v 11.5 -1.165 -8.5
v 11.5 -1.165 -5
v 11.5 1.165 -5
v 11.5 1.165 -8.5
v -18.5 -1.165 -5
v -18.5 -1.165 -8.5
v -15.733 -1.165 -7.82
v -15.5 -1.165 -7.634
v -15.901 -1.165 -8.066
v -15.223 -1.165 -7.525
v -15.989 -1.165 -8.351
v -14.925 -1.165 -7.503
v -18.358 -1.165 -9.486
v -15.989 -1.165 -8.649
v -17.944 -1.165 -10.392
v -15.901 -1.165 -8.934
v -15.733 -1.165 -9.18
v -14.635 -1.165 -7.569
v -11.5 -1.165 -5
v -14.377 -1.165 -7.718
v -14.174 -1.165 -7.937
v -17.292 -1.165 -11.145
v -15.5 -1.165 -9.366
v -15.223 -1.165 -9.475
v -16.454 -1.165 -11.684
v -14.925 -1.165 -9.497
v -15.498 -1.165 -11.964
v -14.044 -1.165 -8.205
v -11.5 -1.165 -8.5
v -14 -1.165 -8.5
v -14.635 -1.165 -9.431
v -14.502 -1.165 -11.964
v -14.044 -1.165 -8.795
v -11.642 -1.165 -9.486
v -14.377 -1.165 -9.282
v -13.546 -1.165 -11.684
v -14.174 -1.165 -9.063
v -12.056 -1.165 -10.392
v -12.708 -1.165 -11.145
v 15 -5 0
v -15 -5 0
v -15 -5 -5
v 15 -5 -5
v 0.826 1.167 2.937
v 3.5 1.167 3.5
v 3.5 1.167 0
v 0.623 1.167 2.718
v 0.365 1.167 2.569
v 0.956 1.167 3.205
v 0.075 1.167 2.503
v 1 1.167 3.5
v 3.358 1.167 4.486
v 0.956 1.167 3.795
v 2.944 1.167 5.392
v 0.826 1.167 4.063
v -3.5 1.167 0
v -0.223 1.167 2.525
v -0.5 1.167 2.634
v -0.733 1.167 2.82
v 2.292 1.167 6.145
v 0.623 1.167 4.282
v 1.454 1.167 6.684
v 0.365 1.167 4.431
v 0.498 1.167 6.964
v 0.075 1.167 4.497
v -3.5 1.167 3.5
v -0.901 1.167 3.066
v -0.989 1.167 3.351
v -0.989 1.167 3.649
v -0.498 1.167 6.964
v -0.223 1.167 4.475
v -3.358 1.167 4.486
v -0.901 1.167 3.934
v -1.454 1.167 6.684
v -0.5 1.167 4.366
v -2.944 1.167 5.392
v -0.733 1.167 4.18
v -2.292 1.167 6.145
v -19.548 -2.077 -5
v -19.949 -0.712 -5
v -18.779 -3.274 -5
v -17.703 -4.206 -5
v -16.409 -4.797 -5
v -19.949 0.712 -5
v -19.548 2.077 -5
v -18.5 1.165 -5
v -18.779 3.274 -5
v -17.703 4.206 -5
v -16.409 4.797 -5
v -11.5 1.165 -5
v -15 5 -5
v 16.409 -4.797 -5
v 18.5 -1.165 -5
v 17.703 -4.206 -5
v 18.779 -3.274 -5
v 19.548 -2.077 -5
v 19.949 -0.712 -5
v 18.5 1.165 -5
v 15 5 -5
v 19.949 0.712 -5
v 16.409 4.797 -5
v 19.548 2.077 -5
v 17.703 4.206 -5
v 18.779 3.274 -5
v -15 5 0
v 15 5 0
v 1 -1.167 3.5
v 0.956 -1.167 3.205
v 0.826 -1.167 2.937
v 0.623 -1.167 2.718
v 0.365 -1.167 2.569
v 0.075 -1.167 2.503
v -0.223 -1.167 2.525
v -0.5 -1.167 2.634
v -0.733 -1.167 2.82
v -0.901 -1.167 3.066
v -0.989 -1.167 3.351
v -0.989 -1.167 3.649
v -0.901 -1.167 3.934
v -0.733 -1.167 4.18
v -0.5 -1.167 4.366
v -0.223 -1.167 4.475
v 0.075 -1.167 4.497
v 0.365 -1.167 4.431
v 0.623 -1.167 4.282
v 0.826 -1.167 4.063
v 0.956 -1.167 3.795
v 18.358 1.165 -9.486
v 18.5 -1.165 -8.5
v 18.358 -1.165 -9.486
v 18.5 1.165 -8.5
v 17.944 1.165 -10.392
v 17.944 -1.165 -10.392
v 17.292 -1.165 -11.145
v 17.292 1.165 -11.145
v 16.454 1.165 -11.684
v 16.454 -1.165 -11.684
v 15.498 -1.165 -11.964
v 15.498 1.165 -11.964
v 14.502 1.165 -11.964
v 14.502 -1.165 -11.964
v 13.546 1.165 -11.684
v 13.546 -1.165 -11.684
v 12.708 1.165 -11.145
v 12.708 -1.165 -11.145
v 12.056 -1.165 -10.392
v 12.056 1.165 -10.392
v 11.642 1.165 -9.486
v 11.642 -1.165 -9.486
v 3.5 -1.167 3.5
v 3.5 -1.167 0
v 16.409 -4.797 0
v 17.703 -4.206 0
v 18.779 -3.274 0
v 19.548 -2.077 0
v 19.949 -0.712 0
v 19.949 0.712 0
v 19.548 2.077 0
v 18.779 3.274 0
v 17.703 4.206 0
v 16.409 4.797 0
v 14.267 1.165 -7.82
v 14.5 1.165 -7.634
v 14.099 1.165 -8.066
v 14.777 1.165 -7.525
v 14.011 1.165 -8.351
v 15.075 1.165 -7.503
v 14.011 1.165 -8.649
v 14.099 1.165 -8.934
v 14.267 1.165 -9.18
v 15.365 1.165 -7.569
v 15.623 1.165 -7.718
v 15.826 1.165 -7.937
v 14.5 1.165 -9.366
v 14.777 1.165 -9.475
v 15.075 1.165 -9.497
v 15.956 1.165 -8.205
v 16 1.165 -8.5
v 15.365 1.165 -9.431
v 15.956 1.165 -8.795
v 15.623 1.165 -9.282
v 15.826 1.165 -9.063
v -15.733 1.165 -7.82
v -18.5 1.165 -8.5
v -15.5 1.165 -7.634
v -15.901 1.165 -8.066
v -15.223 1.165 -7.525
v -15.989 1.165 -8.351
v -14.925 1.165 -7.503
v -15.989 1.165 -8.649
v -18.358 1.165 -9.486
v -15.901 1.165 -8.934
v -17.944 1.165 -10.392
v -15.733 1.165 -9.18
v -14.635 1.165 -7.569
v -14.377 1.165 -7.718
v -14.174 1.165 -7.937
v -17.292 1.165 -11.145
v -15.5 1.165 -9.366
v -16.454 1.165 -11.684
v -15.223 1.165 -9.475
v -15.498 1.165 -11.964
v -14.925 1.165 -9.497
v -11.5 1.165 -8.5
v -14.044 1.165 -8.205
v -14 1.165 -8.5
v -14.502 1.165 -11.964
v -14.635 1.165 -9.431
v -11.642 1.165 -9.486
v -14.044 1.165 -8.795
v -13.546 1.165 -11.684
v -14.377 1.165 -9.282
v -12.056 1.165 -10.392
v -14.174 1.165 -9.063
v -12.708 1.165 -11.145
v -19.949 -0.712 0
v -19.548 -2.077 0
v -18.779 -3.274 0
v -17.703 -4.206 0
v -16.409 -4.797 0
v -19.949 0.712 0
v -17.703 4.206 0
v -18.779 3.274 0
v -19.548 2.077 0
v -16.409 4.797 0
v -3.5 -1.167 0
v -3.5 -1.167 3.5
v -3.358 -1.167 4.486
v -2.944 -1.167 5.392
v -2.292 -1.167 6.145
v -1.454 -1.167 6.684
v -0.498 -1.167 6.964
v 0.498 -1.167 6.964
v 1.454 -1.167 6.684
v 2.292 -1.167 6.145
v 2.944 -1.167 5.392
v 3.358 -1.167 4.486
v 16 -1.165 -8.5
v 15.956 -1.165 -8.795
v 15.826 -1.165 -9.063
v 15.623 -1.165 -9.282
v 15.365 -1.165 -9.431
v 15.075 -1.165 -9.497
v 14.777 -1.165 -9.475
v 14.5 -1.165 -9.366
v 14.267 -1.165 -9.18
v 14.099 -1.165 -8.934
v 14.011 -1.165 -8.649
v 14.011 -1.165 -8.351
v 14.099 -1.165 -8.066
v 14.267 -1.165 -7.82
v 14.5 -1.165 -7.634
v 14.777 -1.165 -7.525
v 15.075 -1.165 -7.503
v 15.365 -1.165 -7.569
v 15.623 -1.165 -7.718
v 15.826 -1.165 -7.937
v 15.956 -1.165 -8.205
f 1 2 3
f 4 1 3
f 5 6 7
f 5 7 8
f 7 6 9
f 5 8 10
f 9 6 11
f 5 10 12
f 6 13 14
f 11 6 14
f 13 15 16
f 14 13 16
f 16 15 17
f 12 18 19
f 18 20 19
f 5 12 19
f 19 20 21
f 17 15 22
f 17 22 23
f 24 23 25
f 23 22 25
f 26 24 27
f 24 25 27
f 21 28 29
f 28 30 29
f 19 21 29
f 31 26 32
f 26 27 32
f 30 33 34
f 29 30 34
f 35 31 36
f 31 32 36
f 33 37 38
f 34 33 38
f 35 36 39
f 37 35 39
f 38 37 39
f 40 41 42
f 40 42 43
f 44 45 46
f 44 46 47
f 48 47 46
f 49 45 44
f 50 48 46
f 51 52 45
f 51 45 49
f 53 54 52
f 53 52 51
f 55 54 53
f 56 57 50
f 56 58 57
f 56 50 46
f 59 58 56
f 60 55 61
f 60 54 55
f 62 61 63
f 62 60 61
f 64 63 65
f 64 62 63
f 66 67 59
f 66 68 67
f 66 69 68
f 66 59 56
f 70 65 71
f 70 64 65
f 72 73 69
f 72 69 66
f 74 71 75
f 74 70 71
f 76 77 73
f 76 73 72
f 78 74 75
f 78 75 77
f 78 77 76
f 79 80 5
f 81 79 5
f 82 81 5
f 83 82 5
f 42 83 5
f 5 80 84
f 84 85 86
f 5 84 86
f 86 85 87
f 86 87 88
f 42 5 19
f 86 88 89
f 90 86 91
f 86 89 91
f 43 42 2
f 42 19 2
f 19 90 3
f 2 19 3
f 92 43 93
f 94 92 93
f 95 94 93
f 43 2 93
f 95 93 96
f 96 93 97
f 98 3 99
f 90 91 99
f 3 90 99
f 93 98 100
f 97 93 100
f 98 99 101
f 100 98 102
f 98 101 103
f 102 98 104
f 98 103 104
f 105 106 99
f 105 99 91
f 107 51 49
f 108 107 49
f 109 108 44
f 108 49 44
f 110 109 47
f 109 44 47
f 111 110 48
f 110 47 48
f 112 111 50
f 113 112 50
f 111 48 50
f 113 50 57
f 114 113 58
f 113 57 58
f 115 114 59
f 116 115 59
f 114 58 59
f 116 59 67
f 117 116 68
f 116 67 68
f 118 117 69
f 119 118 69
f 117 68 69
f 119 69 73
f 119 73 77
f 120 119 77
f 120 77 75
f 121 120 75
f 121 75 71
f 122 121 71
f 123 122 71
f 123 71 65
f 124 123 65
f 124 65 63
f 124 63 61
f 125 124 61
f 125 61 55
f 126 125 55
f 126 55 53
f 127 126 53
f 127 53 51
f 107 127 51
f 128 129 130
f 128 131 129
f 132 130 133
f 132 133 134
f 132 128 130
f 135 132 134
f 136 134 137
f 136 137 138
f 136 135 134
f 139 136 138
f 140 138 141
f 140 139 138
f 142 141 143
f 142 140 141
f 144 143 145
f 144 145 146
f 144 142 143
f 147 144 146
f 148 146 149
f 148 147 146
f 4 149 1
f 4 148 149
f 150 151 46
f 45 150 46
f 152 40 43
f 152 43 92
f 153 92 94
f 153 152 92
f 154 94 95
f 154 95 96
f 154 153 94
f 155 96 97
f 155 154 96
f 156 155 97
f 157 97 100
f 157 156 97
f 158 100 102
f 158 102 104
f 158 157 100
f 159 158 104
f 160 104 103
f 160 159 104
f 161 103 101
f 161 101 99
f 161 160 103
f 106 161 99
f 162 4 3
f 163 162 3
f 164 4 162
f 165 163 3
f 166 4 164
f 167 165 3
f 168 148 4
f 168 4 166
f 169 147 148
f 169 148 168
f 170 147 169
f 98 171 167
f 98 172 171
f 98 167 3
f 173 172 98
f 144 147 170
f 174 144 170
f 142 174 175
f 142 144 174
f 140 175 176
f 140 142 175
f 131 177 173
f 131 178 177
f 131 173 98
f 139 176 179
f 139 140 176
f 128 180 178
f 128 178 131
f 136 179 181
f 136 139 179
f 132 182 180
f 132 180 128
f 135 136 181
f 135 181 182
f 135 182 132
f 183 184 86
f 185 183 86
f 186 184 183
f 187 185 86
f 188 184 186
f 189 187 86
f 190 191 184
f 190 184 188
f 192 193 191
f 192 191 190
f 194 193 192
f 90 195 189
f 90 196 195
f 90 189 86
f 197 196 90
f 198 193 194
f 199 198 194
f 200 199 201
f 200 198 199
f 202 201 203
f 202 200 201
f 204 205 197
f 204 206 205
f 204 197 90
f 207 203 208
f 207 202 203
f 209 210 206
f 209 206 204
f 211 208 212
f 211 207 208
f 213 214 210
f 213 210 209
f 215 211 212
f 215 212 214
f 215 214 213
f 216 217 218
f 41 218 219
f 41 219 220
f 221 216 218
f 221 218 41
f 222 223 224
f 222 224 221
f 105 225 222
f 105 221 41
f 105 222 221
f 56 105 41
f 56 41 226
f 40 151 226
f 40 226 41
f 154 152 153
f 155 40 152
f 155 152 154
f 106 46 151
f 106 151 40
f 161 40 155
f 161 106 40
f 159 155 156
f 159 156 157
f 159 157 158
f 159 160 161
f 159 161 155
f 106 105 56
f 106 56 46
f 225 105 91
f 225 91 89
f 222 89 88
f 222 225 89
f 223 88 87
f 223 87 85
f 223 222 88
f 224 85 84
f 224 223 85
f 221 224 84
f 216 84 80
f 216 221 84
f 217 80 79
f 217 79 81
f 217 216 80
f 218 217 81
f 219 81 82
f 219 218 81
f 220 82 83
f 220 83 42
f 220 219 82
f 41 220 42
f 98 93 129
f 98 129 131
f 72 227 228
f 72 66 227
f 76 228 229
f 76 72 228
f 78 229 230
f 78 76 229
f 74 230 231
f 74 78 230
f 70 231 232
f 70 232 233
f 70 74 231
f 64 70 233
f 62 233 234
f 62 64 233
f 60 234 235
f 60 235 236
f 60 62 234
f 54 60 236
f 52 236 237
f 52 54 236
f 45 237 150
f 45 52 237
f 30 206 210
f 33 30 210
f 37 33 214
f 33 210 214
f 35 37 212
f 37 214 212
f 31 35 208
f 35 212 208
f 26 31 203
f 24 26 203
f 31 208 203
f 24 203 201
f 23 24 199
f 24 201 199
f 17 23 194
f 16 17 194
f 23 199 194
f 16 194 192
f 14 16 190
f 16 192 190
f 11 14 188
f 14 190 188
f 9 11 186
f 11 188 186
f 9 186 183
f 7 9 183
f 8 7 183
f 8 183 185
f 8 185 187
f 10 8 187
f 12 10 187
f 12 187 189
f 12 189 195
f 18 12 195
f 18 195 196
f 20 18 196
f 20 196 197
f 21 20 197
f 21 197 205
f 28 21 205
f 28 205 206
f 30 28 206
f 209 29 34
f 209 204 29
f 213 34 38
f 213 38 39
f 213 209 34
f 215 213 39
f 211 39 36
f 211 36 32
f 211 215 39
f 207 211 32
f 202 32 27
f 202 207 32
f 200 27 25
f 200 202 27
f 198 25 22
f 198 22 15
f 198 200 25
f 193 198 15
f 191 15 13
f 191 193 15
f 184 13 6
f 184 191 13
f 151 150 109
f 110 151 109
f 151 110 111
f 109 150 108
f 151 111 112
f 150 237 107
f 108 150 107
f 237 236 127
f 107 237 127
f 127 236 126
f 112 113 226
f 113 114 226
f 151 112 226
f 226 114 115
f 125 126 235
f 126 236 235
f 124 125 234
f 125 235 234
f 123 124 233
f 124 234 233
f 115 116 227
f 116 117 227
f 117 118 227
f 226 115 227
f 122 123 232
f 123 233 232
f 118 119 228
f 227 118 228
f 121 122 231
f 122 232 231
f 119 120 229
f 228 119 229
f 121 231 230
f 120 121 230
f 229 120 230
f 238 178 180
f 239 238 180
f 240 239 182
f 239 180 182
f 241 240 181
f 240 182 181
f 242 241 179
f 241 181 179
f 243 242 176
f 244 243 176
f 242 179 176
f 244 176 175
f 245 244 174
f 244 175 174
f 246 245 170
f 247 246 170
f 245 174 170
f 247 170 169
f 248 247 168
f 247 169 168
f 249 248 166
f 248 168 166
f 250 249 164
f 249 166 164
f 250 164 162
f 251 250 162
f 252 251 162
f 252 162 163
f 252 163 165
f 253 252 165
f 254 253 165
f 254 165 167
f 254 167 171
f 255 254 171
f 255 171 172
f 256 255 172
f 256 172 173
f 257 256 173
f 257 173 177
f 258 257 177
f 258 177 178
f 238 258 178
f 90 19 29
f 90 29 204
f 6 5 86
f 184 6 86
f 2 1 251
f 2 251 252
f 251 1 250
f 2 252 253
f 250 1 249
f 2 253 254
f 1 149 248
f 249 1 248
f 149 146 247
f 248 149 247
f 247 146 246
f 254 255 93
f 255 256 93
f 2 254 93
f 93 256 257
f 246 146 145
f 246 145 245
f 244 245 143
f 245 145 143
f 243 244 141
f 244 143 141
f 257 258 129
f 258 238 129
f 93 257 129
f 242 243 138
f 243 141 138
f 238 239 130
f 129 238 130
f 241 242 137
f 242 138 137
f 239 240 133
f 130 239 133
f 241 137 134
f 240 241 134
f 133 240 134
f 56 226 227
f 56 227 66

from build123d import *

# Parameters (mm, degrees)
BOSS_EXTRUDE1_DEPTH = 5
SKETCH3_W           = 7
SKETCH3_H           = 2.333333334
BOSS_EXTRUDE2_DEPTH = 3.5
SKETCH6_W           = 3.5
SKETCH6_H           = 2.333333334
REVOLVE1_ANGLE      = 180
CUT_EXTRUDE1_REACH  = 24.069
SKETCH7_R           = 1
SKETCH8_W           = 7
SKETCH8_H           = 2.33
BOSS_EXTRUDE3_DEPTH = 3.5
SKETCH9_W           = 3.5
SKETCH9_H           = 2.33
REVOLVE2_ANGLE      = 180
SKETCH9_3_W         = 3.5
SKETCH9_3_H         = 2.33
REVOLVE3_ANGLE      = 180
CUT_EXTRUDE2_REACH  = 26.125
SKETCH11_R          = 1


with BuildPart() as part:
    # Sketch2 → Boss-Extrude1 (new body)
    with BuildSketch(Plane.XY):
        with BuildLine():
            Line((-15, -5), (15, -5))
            ThreePointArc((15, -5), (20, 0), (15, 5))
            Line((15, 5), (-15, 5))
            ThreePointArc((-15, 5), (-20, 0), (-15, -5))
        make_face()
    extrude(amount=-BOSS_EXTRUDE1_DEPTH)

    # Sketch3 → Boss-Extrude2 (add)
    with BuildSketch(Plane.XY):
        Rectangle(SKETCH3_W, SKETCH3_H)
    extrude(amount=BOSS_EXTRUDE2_DEPTH)

    # Sketch6 → Revolve1 (revolve)
    with BuildSketch(Plane.XY.offset(3.5)):
        with Locations((-1.75, 0)):
            Rectangle(SKETCH6_W, SKETCH6_H)
    revolve(axis=Axis((0, 1.166666667, 3.5), (0, 1, 0)), revolution_arc=REVOLVE1_ANGLE)

    # Sketch7 → Cut-Extrude1 (cut, up to next)
    with BuildSketch(Plane(origin=(0, 1.166666667, 0), x_dir=(1, 0, 0), z_dir=(0, 1, 0)), mode=Mode.PRIVATE) as cut_extrude1_sk1:
        with Locations((0, -3.5)):
            Circle(SKETCH7_R)
    cut_extrude1_tool1 = extrude(cut_extrude1_sk1.sketch, amount=-CUT_EXTRUDE1_REACH, mode=Mode.PRIVATE) & part.part
    add(cut_extrude1_tool1.solids().sort_by_distance((0, 1.166667, 3.5))[0], mode=Mode.SUBTRACT)

    # Sketch8 → Boss-Extrude3 (add)
    with BuildSketch(Plane(origin=(0, 0, -5), x_dir=(-1, 0, 0), z_dir=(0, 0, -1))):
        with Locations((-15, 0)):
            Rectangle(SKETCH8_W, SKETCH8_H)
        with Locations((15, 0)):
            Rectangle(SKETCH8_W, SKETCH8_H)
    extrude(amount=BOSS_EXTRUDE3_DEPTH)

    # Sketch9 → Revolve2 (revolve)
    with BuildSketch(Plane(origin=(0, 0, -8.5), x_dir=(-1, 0, 0), z_dir=(0, 0, -1))):
        with Locations((-16.75, 0)):
            Rectangle(SKETCH9_W, SKETCH9_H)
    revolve(axis=Axis((15, 1.165, -8.5), (0, 1, 0)), revolution_arc=REVOLVE2_ANGLE)

    # Sketch9<3> → Revolve3 (revolve)
    with BuildSketch(Plane(origin=(0, 0, -8.5), x_dir=(-1, 0, 0), z_dir=(0, 0, -1))):
        with Locations((13.25, 0)):
            Rectangle(SKETCH9_3_W, SKETCH9_3_H)
    revolve(axis=Axis((-15, 1.165, -8.5), (0, 1, 0)), revolution_arc=REVOLVE3_ANGLE)

    # Sketch11 → Cut-Extrude2 (cut, up to next)
    with BuildSketch(Plane(origin=(0, 1.165, 0), x_dir=(1, 0, 0), z_dir=(0, 1, 0)), mode=Mode.PRIVATE) as cut_extrude2_sk1:
        with Locations((-15, 8.5)):
            Circle(SKETCH11_R)
    cut_extrude2_tool1 = extrude(cut_extrude2_sk1.sketch, amount=-CUT_EXTRUDE2_REACH, mode=Mode.PRIVATE) & part.part
    # Sketch11 → Cut-Extrude2 (cut, up to next)
    with BuildSketch(Plane(origin=(0, 1.165, 0), x_dir=(1, 0, 0), z_dir=(0, 1, 0)), mode=Mode.PRIVATE) as cut_extrude2_sk2:
        with Locations((15, 8.5)):
            Circle(SKETCH11_R)
    cut_extrude2_tool2 = extrude(cut_extrude2_sk2.sketch, amount=-CUT_EXTRUDE2_REACH, mode=Mode.PRIVATE) & part.part
    add(cut_extrude2_tool1.solids().sort_by_distance((-15, 1.165, -8.5))[0], mode=Mode.SUBTRACT)
    add(cut_extrude2_tool2.solids().sort_by_distance((15, 1.165, -8.5))[0], mode=Mode.SUBTRACT)


solid = part.part
